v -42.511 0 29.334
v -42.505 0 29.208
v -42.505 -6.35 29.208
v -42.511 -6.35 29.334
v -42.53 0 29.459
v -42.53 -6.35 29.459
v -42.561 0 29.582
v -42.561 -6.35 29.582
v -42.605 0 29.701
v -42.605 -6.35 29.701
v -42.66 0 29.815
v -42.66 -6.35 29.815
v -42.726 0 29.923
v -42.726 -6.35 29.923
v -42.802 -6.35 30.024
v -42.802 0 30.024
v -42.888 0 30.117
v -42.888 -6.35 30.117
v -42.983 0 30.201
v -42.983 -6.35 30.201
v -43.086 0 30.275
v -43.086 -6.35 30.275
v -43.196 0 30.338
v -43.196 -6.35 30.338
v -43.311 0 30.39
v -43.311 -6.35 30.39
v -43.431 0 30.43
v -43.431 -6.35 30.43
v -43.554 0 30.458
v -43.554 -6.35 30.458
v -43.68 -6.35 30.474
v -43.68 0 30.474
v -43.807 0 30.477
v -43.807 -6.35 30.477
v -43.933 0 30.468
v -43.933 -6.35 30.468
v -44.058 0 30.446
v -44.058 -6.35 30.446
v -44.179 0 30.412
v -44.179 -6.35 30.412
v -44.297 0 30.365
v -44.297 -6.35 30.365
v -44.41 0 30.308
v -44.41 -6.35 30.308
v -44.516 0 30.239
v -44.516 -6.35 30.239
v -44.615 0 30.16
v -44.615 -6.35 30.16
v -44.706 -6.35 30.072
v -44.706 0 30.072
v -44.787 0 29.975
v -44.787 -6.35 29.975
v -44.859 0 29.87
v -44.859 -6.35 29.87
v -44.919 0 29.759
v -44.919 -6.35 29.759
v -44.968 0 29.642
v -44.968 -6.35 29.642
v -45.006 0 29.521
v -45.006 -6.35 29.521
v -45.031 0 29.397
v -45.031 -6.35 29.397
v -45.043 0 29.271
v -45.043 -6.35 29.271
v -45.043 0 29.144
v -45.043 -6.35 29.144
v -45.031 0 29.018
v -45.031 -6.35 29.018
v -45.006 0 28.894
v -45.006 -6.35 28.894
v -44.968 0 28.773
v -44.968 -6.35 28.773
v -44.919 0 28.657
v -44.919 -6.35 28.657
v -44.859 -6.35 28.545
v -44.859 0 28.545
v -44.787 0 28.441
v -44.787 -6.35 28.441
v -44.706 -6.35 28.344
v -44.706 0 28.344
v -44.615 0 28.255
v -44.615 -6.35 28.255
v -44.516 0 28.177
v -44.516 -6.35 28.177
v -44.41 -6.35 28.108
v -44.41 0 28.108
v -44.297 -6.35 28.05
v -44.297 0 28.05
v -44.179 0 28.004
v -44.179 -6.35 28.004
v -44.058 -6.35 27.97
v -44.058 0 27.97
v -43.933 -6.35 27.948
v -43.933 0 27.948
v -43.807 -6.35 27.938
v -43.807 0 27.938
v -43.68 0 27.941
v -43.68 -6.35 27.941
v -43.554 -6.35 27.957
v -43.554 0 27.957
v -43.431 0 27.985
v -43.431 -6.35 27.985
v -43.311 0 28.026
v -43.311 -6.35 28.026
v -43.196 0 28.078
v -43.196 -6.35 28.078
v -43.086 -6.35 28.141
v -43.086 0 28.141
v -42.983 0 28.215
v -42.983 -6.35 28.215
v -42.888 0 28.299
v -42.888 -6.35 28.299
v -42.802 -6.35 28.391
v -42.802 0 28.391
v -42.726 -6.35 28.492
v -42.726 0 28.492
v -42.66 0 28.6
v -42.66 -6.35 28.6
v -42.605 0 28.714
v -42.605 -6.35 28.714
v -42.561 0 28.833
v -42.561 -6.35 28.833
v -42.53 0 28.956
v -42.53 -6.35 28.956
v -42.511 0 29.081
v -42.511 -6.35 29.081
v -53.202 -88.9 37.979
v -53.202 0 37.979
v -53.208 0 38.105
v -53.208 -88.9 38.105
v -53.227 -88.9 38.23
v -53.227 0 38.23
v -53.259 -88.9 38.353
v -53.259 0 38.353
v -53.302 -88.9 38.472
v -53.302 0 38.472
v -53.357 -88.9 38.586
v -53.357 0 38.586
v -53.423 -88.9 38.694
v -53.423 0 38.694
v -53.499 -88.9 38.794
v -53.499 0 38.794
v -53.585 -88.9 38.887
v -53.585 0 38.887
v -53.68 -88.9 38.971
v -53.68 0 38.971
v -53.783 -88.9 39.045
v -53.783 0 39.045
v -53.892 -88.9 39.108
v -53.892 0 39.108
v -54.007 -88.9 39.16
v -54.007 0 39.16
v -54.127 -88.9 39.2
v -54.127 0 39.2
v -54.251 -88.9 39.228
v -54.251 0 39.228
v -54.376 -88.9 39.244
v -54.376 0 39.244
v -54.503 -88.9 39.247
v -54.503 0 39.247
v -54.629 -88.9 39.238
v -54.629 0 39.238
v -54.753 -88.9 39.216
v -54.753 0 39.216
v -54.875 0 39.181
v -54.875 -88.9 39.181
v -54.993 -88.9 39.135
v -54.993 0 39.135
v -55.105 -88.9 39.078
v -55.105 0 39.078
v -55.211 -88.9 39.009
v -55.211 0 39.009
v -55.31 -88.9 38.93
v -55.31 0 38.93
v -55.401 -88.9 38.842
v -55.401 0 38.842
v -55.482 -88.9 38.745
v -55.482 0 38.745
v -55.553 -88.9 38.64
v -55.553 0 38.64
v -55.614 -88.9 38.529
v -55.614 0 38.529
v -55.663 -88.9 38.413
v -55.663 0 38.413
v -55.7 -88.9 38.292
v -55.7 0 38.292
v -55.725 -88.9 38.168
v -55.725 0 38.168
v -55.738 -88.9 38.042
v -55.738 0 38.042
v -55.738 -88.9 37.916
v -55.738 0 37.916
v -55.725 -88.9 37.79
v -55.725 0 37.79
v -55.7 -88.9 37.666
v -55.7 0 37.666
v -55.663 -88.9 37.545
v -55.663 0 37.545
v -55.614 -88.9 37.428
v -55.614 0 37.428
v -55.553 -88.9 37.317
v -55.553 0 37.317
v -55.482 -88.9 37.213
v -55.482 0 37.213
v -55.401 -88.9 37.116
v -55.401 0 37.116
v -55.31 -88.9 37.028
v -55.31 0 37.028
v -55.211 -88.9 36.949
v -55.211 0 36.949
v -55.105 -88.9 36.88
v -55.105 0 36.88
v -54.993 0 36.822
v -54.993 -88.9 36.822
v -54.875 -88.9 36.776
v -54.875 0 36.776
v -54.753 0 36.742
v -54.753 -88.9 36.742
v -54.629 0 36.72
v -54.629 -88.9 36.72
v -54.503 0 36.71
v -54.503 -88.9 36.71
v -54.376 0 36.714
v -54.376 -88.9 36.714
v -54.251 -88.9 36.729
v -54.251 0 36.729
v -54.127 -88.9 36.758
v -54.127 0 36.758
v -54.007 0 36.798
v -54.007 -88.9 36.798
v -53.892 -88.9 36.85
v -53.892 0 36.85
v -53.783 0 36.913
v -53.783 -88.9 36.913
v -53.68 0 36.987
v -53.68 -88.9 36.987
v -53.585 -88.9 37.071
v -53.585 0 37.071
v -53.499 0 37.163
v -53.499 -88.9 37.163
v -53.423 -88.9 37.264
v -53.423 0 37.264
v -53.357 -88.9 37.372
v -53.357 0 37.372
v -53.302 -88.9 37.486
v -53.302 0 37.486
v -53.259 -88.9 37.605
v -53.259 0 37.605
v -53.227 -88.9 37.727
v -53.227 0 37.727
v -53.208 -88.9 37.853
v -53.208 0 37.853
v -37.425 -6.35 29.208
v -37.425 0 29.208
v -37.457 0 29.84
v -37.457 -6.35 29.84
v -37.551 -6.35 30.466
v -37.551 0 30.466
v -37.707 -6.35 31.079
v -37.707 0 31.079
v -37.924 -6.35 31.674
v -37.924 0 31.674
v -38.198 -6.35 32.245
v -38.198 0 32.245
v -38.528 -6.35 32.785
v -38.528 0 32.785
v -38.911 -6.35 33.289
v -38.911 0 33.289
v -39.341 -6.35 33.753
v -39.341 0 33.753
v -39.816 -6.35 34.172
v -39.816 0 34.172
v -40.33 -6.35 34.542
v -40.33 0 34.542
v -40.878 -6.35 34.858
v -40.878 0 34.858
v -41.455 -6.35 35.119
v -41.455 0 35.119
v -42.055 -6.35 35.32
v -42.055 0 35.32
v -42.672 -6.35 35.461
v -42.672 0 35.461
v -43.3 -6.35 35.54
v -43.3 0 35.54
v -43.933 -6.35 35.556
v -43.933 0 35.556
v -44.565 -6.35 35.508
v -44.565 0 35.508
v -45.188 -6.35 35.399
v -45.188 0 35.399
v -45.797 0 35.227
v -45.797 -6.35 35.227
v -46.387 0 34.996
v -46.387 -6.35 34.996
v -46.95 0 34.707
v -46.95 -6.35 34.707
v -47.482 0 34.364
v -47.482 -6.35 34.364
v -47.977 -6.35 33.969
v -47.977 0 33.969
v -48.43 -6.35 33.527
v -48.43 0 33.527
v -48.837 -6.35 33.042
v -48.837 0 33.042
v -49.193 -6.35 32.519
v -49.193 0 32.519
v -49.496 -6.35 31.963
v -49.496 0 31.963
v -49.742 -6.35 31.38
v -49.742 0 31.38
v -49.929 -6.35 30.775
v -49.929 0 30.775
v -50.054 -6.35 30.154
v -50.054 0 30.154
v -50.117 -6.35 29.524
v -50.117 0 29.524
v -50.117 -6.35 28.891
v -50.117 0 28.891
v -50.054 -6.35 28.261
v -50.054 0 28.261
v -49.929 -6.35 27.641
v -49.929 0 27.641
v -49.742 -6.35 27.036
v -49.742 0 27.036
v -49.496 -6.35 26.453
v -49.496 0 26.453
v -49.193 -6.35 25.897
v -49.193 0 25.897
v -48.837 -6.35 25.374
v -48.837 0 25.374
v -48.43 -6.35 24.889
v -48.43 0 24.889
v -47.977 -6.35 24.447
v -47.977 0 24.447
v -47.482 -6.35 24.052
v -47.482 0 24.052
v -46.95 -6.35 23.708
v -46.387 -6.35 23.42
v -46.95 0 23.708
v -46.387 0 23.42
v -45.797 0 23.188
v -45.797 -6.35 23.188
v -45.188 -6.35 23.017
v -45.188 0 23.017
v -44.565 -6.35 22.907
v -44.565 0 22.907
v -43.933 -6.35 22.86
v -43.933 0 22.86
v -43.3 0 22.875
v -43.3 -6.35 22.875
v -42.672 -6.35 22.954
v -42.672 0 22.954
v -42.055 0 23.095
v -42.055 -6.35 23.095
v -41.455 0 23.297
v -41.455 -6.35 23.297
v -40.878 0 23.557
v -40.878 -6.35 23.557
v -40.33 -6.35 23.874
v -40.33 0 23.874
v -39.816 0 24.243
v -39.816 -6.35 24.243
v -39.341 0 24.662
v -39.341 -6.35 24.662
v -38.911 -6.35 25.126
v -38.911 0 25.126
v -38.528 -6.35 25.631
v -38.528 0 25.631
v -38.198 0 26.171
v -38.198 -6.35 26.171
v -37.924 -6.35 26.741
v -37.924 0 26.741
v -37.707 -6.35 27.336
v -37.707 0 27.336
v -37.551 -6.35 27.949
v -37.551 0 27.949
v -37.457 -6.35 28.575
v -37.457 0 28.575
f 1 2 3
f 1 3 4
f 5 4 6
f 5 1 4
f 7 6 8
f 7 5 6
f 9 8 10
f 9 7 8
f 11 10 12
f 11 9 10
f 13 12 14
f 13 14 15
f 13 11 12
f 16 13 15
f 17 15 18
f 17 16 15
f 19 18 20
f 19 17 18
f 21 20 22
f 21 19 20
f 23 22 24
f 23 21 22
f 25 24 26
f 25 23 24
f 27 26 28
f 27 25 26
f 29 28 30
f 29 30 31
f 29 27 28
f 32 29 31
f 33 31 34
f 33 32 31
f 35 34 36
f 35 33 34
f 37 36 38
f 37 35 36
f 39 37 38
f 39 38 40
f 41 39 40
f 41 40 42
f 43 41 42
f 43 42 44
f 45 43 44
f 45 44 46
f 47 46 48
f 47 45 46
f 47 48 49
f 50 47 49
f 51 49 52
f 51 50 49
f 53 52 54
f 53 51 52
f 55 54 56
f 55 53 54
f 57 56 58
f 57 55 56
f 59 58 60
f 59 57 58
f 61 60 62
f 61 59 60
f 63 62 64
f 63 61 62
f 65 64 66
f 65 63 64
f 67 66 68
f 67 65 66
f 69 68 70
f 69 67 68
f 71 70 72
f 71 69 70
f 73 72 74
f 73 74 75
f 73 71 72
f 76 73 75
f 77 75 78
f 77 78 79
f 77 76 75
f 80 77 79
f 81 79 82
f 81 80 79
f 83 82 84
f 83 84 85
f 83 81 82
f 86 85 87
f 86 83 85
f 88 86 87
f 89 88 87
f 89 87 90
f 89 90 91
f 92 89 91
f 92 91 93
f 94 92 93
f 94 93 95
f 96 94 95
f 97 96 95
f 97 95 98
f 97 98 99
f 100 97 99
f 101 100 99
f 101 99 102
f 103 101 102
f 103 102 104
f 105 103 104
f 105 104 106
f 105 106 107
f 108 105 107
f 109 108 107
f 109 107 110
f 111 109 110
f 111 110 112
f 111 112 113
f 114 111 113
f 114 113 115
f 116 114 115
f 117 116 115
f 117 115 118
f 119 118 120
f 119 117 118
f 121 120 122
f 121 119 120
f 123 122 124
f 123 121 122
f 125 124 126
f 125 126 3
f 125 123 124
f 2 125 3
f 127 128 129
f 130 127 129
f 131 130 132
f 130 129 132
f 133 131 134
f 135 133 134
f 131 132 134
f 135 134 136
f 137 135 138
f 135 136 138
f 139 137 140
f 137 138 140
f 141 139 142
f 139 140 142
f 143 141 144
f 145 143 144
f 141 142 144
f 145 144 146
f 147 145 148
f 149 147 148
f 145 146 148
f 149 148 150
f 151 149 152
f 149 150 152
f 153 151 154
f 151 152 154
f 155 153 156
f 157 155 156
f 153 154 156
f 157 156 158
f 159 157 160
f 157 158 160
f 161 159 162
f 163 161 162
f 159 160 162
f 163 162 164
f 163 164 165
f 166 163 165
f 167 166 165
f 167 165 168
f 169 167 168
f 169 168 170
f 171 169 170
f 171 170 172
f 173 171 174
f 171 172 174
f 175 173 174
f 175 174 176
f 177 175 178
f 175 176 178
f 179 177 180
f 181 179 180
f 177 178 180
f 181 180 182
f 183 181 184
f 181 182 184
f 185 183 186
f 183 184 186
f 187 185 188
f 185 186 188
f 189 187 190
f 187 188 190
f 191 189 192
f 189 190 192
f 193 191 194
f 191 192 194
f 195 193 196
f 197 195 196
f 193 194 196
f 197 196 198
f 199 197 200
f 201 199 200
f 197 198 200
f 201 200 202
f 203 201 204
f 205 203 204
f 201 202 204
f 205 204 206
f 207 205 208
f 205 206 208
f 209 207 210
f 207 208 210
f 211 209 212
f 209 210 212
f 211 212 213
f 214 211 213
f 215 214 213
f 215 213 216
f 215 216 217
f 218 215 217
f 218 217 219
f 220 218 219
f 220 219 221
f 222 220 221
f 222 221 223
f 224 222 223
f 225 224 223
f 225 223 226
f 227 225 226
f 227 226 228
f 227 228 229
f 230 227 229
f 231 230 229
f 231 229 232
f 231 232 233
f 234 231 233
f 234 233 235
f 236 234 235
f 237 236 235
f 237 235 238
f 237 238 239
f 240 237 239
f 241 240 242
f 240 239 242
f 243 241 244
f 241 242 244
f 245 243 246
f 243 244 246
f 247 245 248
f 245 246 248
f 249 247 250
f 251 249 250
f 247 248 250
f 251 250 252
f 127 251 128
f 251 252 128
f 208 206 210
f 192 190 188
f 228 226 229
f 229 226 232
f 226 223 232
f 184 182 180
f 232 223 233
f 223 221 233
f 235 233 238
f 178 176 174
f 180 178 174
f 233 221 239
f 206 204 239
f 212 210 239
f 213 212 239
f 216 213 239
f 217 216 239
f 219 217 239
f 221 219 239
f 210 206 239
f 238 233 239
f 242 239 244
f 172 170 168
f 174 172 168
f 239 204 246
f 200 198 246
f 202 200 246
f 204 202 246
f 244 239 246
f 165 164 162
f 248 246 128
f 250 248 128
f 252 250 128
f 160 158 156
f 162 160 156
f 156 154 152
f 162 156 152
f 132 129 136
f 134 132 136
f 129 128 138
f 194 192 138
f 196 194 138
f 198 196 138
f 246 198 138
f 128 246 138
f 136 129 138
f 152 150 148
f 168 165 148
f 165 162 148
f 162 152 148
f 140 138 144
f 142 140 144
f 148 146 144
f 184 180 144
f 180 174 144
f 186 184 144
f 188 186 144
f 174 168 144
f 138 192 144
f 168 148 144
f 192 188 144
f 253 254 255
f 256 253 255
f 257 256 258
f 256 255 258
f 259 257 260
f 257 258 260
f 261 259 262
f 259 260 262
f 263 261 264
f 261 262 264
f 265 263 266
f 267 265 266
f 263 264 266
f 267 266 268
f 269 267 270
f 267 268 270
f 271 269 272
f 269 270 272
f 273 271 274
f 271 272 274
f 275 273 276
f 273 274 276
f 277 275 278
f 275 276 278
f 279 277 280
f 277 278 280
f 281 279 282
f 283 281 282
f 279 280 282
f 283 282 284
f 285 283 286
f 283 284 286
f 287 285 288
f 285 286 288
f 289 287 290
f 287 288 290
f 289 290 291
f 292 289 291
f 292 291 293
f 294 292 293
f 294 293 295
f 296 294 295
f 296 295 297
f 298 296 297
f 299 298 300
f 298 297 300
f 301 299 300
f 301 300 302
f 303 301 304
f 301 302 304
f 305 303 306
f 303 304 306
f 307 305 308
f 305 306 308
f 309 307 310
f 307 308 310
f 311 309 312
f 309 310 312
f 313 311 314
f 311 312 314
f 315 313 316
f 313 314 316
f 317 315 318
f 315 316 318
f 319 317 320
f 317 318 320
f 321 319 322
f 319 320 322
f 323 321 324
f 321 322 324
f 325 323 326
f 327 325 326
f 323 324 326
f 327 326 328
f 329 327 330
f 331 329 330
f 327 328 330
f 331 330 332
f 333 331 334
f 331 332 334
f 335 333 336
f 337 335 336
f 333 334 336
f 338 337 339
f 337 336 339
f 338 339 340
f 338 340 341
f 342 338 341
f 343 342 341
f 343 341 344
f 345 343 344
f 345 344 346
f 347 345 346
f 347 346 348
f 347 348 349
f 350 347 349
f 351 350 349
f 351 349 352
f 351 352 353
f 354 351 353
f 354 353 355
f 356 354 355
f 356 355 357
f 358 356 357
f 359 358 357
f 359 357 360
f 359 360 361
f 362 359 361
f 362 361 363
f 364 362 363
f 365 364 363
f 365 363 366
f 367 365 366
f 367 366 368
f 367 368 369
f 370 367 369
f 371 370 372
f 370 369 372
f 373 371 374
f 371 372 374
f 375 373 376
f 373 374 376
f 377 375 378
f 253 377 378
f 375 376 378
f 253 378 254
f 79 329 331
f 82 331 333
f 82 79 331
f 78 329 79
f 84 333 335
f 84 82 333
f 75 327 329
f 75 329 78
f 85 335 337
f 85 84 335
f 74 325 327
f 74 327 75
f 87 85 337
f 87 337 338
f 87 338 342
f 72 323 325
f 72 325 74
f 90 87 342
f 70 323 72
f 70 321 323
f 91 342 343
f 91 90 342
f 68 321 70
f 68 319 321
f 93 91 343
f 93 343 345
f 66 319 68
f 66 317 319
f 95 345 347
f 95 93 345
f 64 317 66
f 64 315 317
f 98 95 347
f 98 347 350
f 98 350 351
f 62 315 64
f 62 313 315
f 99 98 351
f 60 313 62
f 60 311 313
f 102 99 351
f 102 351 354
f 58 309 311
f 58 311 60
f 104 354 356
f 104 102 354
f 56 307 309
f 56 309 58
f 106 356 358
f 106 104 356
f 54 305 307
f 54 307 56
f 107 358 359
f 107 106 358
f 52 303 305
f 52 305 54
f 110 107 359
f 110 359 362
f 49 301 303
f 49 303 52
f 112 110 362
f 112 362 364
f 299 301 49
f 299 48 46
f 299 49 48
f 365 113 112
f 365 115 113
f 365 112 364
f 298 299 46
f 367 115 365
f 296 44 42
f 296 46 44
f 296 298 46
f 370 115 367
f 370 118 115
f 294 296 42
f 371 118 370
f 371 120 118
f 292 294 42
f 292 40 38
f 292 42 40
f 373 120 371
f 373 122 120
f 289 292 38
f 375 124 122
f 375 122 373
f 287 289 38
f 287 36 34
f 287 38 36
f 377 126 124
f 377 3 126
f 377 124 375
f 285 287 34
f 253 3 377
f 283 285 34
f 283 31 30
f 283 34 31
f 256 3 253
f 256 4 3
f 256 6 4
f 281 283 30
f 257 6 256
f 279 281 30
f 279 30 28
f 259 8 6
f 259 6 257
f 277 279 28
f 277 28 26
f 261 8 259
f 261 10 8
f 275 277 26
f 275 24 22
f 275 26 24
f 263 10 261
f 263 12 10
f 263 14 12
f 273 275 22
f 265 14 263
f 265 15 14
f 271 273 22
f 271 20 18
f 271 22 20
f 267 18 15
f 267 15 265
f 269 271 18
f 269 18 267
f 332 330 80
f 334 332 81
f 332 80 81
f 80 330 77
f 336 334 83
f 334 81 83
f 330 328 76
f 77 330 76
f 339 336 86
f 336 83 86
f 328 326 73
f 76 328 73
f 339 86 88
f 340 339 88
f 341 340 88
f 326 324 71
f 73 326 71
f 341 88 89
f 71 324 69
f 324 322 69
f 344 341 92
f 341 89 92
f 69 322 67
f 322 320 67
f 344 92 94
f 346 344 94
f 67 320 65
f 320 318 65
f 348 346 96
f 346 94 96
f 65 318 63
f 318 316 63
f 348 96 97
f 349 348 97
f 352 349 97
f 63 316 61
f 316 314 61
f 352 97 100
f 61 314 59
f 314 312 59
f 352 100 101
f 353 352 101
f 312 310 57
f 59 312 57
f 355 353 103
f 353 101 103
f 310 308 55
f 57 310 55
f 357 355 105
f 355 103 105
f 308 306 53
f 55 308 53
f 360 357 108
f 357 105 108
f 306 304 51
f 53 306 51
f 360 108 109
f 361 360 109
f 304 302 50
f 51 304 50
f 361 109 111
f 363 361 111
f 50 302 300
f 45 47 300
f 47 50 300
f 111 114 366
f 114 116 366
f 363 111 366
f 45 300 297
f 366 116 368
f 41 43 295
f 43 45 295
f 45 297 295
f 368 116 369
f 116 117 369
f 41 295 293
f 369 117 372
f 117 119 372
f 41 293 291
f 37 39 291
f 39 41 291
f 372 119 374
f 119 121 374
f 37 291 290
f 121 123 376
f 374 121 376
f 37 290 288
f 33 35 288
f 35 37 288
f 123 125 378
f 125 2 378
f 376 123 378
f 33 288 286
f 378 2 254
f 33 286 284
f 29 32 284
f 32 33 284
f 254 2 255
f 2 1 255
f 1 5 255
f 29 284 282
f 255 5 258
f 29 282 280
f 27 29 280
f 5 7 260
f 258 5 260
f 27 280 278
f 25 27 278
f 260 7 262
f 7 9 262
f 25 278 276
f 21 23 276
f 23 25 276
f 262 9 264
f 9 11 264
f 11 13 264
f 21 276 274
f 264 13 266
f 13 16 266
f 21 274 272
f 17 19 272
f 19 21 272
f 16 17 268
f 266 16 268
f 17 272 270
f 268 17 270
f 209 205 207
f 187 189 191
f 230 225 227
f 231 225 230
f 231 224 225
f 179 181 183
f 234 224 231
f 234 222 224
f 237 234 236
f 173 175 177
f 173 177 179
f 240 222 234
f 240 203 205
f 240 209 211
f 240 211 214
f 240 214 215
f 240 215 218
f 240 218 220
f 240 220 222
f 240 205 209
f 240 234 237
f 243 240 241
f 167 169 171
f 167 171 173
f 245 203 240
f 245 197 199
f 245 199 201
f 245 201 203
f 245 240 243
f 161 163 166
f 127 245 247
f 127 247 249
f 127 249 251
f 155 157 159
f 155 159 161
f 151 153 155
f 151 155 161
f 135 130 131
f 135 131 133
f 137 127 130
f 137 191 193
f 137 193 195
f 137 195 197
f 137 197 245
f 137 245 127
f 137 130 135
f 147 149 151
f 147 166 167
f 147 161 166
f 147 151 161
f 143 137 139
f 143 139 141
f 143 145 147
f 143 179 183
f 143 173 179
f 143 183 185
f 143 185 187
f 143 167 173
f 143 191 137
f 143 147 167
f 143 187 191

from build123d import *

# Parameters (mm, degrees)
F0_R     = 1.26873
F1_DEPTH = 88.9
F2_R     = 6.35
F2_R_2   = 1.27
F3_DEPTH = 6.35


with BuildPart() as f1:
    # F0 (on Front) → F1 (new body)
    with BuildSketch(Plane.XZ):
        with Locations((-54.470886, 37.978835)):
            Circle(F0_R)
    extrude(amount=F1_DEPTH)


with BuildPart() as f3:
    # F2 (on Front) → F3 (new body)
    with BuildSketch(Plane.XZ):
        with Locations((-43.774951, 29.207721)):
            Circle(F2_R)
        with Locations((-43.774951, 29.207721)):
            Circle(F2_R_2, mode=Mode.SUBTRACT)
    extrude(amount=F3_DEPTH)


solid = Compound([f1.part, f3.part])
